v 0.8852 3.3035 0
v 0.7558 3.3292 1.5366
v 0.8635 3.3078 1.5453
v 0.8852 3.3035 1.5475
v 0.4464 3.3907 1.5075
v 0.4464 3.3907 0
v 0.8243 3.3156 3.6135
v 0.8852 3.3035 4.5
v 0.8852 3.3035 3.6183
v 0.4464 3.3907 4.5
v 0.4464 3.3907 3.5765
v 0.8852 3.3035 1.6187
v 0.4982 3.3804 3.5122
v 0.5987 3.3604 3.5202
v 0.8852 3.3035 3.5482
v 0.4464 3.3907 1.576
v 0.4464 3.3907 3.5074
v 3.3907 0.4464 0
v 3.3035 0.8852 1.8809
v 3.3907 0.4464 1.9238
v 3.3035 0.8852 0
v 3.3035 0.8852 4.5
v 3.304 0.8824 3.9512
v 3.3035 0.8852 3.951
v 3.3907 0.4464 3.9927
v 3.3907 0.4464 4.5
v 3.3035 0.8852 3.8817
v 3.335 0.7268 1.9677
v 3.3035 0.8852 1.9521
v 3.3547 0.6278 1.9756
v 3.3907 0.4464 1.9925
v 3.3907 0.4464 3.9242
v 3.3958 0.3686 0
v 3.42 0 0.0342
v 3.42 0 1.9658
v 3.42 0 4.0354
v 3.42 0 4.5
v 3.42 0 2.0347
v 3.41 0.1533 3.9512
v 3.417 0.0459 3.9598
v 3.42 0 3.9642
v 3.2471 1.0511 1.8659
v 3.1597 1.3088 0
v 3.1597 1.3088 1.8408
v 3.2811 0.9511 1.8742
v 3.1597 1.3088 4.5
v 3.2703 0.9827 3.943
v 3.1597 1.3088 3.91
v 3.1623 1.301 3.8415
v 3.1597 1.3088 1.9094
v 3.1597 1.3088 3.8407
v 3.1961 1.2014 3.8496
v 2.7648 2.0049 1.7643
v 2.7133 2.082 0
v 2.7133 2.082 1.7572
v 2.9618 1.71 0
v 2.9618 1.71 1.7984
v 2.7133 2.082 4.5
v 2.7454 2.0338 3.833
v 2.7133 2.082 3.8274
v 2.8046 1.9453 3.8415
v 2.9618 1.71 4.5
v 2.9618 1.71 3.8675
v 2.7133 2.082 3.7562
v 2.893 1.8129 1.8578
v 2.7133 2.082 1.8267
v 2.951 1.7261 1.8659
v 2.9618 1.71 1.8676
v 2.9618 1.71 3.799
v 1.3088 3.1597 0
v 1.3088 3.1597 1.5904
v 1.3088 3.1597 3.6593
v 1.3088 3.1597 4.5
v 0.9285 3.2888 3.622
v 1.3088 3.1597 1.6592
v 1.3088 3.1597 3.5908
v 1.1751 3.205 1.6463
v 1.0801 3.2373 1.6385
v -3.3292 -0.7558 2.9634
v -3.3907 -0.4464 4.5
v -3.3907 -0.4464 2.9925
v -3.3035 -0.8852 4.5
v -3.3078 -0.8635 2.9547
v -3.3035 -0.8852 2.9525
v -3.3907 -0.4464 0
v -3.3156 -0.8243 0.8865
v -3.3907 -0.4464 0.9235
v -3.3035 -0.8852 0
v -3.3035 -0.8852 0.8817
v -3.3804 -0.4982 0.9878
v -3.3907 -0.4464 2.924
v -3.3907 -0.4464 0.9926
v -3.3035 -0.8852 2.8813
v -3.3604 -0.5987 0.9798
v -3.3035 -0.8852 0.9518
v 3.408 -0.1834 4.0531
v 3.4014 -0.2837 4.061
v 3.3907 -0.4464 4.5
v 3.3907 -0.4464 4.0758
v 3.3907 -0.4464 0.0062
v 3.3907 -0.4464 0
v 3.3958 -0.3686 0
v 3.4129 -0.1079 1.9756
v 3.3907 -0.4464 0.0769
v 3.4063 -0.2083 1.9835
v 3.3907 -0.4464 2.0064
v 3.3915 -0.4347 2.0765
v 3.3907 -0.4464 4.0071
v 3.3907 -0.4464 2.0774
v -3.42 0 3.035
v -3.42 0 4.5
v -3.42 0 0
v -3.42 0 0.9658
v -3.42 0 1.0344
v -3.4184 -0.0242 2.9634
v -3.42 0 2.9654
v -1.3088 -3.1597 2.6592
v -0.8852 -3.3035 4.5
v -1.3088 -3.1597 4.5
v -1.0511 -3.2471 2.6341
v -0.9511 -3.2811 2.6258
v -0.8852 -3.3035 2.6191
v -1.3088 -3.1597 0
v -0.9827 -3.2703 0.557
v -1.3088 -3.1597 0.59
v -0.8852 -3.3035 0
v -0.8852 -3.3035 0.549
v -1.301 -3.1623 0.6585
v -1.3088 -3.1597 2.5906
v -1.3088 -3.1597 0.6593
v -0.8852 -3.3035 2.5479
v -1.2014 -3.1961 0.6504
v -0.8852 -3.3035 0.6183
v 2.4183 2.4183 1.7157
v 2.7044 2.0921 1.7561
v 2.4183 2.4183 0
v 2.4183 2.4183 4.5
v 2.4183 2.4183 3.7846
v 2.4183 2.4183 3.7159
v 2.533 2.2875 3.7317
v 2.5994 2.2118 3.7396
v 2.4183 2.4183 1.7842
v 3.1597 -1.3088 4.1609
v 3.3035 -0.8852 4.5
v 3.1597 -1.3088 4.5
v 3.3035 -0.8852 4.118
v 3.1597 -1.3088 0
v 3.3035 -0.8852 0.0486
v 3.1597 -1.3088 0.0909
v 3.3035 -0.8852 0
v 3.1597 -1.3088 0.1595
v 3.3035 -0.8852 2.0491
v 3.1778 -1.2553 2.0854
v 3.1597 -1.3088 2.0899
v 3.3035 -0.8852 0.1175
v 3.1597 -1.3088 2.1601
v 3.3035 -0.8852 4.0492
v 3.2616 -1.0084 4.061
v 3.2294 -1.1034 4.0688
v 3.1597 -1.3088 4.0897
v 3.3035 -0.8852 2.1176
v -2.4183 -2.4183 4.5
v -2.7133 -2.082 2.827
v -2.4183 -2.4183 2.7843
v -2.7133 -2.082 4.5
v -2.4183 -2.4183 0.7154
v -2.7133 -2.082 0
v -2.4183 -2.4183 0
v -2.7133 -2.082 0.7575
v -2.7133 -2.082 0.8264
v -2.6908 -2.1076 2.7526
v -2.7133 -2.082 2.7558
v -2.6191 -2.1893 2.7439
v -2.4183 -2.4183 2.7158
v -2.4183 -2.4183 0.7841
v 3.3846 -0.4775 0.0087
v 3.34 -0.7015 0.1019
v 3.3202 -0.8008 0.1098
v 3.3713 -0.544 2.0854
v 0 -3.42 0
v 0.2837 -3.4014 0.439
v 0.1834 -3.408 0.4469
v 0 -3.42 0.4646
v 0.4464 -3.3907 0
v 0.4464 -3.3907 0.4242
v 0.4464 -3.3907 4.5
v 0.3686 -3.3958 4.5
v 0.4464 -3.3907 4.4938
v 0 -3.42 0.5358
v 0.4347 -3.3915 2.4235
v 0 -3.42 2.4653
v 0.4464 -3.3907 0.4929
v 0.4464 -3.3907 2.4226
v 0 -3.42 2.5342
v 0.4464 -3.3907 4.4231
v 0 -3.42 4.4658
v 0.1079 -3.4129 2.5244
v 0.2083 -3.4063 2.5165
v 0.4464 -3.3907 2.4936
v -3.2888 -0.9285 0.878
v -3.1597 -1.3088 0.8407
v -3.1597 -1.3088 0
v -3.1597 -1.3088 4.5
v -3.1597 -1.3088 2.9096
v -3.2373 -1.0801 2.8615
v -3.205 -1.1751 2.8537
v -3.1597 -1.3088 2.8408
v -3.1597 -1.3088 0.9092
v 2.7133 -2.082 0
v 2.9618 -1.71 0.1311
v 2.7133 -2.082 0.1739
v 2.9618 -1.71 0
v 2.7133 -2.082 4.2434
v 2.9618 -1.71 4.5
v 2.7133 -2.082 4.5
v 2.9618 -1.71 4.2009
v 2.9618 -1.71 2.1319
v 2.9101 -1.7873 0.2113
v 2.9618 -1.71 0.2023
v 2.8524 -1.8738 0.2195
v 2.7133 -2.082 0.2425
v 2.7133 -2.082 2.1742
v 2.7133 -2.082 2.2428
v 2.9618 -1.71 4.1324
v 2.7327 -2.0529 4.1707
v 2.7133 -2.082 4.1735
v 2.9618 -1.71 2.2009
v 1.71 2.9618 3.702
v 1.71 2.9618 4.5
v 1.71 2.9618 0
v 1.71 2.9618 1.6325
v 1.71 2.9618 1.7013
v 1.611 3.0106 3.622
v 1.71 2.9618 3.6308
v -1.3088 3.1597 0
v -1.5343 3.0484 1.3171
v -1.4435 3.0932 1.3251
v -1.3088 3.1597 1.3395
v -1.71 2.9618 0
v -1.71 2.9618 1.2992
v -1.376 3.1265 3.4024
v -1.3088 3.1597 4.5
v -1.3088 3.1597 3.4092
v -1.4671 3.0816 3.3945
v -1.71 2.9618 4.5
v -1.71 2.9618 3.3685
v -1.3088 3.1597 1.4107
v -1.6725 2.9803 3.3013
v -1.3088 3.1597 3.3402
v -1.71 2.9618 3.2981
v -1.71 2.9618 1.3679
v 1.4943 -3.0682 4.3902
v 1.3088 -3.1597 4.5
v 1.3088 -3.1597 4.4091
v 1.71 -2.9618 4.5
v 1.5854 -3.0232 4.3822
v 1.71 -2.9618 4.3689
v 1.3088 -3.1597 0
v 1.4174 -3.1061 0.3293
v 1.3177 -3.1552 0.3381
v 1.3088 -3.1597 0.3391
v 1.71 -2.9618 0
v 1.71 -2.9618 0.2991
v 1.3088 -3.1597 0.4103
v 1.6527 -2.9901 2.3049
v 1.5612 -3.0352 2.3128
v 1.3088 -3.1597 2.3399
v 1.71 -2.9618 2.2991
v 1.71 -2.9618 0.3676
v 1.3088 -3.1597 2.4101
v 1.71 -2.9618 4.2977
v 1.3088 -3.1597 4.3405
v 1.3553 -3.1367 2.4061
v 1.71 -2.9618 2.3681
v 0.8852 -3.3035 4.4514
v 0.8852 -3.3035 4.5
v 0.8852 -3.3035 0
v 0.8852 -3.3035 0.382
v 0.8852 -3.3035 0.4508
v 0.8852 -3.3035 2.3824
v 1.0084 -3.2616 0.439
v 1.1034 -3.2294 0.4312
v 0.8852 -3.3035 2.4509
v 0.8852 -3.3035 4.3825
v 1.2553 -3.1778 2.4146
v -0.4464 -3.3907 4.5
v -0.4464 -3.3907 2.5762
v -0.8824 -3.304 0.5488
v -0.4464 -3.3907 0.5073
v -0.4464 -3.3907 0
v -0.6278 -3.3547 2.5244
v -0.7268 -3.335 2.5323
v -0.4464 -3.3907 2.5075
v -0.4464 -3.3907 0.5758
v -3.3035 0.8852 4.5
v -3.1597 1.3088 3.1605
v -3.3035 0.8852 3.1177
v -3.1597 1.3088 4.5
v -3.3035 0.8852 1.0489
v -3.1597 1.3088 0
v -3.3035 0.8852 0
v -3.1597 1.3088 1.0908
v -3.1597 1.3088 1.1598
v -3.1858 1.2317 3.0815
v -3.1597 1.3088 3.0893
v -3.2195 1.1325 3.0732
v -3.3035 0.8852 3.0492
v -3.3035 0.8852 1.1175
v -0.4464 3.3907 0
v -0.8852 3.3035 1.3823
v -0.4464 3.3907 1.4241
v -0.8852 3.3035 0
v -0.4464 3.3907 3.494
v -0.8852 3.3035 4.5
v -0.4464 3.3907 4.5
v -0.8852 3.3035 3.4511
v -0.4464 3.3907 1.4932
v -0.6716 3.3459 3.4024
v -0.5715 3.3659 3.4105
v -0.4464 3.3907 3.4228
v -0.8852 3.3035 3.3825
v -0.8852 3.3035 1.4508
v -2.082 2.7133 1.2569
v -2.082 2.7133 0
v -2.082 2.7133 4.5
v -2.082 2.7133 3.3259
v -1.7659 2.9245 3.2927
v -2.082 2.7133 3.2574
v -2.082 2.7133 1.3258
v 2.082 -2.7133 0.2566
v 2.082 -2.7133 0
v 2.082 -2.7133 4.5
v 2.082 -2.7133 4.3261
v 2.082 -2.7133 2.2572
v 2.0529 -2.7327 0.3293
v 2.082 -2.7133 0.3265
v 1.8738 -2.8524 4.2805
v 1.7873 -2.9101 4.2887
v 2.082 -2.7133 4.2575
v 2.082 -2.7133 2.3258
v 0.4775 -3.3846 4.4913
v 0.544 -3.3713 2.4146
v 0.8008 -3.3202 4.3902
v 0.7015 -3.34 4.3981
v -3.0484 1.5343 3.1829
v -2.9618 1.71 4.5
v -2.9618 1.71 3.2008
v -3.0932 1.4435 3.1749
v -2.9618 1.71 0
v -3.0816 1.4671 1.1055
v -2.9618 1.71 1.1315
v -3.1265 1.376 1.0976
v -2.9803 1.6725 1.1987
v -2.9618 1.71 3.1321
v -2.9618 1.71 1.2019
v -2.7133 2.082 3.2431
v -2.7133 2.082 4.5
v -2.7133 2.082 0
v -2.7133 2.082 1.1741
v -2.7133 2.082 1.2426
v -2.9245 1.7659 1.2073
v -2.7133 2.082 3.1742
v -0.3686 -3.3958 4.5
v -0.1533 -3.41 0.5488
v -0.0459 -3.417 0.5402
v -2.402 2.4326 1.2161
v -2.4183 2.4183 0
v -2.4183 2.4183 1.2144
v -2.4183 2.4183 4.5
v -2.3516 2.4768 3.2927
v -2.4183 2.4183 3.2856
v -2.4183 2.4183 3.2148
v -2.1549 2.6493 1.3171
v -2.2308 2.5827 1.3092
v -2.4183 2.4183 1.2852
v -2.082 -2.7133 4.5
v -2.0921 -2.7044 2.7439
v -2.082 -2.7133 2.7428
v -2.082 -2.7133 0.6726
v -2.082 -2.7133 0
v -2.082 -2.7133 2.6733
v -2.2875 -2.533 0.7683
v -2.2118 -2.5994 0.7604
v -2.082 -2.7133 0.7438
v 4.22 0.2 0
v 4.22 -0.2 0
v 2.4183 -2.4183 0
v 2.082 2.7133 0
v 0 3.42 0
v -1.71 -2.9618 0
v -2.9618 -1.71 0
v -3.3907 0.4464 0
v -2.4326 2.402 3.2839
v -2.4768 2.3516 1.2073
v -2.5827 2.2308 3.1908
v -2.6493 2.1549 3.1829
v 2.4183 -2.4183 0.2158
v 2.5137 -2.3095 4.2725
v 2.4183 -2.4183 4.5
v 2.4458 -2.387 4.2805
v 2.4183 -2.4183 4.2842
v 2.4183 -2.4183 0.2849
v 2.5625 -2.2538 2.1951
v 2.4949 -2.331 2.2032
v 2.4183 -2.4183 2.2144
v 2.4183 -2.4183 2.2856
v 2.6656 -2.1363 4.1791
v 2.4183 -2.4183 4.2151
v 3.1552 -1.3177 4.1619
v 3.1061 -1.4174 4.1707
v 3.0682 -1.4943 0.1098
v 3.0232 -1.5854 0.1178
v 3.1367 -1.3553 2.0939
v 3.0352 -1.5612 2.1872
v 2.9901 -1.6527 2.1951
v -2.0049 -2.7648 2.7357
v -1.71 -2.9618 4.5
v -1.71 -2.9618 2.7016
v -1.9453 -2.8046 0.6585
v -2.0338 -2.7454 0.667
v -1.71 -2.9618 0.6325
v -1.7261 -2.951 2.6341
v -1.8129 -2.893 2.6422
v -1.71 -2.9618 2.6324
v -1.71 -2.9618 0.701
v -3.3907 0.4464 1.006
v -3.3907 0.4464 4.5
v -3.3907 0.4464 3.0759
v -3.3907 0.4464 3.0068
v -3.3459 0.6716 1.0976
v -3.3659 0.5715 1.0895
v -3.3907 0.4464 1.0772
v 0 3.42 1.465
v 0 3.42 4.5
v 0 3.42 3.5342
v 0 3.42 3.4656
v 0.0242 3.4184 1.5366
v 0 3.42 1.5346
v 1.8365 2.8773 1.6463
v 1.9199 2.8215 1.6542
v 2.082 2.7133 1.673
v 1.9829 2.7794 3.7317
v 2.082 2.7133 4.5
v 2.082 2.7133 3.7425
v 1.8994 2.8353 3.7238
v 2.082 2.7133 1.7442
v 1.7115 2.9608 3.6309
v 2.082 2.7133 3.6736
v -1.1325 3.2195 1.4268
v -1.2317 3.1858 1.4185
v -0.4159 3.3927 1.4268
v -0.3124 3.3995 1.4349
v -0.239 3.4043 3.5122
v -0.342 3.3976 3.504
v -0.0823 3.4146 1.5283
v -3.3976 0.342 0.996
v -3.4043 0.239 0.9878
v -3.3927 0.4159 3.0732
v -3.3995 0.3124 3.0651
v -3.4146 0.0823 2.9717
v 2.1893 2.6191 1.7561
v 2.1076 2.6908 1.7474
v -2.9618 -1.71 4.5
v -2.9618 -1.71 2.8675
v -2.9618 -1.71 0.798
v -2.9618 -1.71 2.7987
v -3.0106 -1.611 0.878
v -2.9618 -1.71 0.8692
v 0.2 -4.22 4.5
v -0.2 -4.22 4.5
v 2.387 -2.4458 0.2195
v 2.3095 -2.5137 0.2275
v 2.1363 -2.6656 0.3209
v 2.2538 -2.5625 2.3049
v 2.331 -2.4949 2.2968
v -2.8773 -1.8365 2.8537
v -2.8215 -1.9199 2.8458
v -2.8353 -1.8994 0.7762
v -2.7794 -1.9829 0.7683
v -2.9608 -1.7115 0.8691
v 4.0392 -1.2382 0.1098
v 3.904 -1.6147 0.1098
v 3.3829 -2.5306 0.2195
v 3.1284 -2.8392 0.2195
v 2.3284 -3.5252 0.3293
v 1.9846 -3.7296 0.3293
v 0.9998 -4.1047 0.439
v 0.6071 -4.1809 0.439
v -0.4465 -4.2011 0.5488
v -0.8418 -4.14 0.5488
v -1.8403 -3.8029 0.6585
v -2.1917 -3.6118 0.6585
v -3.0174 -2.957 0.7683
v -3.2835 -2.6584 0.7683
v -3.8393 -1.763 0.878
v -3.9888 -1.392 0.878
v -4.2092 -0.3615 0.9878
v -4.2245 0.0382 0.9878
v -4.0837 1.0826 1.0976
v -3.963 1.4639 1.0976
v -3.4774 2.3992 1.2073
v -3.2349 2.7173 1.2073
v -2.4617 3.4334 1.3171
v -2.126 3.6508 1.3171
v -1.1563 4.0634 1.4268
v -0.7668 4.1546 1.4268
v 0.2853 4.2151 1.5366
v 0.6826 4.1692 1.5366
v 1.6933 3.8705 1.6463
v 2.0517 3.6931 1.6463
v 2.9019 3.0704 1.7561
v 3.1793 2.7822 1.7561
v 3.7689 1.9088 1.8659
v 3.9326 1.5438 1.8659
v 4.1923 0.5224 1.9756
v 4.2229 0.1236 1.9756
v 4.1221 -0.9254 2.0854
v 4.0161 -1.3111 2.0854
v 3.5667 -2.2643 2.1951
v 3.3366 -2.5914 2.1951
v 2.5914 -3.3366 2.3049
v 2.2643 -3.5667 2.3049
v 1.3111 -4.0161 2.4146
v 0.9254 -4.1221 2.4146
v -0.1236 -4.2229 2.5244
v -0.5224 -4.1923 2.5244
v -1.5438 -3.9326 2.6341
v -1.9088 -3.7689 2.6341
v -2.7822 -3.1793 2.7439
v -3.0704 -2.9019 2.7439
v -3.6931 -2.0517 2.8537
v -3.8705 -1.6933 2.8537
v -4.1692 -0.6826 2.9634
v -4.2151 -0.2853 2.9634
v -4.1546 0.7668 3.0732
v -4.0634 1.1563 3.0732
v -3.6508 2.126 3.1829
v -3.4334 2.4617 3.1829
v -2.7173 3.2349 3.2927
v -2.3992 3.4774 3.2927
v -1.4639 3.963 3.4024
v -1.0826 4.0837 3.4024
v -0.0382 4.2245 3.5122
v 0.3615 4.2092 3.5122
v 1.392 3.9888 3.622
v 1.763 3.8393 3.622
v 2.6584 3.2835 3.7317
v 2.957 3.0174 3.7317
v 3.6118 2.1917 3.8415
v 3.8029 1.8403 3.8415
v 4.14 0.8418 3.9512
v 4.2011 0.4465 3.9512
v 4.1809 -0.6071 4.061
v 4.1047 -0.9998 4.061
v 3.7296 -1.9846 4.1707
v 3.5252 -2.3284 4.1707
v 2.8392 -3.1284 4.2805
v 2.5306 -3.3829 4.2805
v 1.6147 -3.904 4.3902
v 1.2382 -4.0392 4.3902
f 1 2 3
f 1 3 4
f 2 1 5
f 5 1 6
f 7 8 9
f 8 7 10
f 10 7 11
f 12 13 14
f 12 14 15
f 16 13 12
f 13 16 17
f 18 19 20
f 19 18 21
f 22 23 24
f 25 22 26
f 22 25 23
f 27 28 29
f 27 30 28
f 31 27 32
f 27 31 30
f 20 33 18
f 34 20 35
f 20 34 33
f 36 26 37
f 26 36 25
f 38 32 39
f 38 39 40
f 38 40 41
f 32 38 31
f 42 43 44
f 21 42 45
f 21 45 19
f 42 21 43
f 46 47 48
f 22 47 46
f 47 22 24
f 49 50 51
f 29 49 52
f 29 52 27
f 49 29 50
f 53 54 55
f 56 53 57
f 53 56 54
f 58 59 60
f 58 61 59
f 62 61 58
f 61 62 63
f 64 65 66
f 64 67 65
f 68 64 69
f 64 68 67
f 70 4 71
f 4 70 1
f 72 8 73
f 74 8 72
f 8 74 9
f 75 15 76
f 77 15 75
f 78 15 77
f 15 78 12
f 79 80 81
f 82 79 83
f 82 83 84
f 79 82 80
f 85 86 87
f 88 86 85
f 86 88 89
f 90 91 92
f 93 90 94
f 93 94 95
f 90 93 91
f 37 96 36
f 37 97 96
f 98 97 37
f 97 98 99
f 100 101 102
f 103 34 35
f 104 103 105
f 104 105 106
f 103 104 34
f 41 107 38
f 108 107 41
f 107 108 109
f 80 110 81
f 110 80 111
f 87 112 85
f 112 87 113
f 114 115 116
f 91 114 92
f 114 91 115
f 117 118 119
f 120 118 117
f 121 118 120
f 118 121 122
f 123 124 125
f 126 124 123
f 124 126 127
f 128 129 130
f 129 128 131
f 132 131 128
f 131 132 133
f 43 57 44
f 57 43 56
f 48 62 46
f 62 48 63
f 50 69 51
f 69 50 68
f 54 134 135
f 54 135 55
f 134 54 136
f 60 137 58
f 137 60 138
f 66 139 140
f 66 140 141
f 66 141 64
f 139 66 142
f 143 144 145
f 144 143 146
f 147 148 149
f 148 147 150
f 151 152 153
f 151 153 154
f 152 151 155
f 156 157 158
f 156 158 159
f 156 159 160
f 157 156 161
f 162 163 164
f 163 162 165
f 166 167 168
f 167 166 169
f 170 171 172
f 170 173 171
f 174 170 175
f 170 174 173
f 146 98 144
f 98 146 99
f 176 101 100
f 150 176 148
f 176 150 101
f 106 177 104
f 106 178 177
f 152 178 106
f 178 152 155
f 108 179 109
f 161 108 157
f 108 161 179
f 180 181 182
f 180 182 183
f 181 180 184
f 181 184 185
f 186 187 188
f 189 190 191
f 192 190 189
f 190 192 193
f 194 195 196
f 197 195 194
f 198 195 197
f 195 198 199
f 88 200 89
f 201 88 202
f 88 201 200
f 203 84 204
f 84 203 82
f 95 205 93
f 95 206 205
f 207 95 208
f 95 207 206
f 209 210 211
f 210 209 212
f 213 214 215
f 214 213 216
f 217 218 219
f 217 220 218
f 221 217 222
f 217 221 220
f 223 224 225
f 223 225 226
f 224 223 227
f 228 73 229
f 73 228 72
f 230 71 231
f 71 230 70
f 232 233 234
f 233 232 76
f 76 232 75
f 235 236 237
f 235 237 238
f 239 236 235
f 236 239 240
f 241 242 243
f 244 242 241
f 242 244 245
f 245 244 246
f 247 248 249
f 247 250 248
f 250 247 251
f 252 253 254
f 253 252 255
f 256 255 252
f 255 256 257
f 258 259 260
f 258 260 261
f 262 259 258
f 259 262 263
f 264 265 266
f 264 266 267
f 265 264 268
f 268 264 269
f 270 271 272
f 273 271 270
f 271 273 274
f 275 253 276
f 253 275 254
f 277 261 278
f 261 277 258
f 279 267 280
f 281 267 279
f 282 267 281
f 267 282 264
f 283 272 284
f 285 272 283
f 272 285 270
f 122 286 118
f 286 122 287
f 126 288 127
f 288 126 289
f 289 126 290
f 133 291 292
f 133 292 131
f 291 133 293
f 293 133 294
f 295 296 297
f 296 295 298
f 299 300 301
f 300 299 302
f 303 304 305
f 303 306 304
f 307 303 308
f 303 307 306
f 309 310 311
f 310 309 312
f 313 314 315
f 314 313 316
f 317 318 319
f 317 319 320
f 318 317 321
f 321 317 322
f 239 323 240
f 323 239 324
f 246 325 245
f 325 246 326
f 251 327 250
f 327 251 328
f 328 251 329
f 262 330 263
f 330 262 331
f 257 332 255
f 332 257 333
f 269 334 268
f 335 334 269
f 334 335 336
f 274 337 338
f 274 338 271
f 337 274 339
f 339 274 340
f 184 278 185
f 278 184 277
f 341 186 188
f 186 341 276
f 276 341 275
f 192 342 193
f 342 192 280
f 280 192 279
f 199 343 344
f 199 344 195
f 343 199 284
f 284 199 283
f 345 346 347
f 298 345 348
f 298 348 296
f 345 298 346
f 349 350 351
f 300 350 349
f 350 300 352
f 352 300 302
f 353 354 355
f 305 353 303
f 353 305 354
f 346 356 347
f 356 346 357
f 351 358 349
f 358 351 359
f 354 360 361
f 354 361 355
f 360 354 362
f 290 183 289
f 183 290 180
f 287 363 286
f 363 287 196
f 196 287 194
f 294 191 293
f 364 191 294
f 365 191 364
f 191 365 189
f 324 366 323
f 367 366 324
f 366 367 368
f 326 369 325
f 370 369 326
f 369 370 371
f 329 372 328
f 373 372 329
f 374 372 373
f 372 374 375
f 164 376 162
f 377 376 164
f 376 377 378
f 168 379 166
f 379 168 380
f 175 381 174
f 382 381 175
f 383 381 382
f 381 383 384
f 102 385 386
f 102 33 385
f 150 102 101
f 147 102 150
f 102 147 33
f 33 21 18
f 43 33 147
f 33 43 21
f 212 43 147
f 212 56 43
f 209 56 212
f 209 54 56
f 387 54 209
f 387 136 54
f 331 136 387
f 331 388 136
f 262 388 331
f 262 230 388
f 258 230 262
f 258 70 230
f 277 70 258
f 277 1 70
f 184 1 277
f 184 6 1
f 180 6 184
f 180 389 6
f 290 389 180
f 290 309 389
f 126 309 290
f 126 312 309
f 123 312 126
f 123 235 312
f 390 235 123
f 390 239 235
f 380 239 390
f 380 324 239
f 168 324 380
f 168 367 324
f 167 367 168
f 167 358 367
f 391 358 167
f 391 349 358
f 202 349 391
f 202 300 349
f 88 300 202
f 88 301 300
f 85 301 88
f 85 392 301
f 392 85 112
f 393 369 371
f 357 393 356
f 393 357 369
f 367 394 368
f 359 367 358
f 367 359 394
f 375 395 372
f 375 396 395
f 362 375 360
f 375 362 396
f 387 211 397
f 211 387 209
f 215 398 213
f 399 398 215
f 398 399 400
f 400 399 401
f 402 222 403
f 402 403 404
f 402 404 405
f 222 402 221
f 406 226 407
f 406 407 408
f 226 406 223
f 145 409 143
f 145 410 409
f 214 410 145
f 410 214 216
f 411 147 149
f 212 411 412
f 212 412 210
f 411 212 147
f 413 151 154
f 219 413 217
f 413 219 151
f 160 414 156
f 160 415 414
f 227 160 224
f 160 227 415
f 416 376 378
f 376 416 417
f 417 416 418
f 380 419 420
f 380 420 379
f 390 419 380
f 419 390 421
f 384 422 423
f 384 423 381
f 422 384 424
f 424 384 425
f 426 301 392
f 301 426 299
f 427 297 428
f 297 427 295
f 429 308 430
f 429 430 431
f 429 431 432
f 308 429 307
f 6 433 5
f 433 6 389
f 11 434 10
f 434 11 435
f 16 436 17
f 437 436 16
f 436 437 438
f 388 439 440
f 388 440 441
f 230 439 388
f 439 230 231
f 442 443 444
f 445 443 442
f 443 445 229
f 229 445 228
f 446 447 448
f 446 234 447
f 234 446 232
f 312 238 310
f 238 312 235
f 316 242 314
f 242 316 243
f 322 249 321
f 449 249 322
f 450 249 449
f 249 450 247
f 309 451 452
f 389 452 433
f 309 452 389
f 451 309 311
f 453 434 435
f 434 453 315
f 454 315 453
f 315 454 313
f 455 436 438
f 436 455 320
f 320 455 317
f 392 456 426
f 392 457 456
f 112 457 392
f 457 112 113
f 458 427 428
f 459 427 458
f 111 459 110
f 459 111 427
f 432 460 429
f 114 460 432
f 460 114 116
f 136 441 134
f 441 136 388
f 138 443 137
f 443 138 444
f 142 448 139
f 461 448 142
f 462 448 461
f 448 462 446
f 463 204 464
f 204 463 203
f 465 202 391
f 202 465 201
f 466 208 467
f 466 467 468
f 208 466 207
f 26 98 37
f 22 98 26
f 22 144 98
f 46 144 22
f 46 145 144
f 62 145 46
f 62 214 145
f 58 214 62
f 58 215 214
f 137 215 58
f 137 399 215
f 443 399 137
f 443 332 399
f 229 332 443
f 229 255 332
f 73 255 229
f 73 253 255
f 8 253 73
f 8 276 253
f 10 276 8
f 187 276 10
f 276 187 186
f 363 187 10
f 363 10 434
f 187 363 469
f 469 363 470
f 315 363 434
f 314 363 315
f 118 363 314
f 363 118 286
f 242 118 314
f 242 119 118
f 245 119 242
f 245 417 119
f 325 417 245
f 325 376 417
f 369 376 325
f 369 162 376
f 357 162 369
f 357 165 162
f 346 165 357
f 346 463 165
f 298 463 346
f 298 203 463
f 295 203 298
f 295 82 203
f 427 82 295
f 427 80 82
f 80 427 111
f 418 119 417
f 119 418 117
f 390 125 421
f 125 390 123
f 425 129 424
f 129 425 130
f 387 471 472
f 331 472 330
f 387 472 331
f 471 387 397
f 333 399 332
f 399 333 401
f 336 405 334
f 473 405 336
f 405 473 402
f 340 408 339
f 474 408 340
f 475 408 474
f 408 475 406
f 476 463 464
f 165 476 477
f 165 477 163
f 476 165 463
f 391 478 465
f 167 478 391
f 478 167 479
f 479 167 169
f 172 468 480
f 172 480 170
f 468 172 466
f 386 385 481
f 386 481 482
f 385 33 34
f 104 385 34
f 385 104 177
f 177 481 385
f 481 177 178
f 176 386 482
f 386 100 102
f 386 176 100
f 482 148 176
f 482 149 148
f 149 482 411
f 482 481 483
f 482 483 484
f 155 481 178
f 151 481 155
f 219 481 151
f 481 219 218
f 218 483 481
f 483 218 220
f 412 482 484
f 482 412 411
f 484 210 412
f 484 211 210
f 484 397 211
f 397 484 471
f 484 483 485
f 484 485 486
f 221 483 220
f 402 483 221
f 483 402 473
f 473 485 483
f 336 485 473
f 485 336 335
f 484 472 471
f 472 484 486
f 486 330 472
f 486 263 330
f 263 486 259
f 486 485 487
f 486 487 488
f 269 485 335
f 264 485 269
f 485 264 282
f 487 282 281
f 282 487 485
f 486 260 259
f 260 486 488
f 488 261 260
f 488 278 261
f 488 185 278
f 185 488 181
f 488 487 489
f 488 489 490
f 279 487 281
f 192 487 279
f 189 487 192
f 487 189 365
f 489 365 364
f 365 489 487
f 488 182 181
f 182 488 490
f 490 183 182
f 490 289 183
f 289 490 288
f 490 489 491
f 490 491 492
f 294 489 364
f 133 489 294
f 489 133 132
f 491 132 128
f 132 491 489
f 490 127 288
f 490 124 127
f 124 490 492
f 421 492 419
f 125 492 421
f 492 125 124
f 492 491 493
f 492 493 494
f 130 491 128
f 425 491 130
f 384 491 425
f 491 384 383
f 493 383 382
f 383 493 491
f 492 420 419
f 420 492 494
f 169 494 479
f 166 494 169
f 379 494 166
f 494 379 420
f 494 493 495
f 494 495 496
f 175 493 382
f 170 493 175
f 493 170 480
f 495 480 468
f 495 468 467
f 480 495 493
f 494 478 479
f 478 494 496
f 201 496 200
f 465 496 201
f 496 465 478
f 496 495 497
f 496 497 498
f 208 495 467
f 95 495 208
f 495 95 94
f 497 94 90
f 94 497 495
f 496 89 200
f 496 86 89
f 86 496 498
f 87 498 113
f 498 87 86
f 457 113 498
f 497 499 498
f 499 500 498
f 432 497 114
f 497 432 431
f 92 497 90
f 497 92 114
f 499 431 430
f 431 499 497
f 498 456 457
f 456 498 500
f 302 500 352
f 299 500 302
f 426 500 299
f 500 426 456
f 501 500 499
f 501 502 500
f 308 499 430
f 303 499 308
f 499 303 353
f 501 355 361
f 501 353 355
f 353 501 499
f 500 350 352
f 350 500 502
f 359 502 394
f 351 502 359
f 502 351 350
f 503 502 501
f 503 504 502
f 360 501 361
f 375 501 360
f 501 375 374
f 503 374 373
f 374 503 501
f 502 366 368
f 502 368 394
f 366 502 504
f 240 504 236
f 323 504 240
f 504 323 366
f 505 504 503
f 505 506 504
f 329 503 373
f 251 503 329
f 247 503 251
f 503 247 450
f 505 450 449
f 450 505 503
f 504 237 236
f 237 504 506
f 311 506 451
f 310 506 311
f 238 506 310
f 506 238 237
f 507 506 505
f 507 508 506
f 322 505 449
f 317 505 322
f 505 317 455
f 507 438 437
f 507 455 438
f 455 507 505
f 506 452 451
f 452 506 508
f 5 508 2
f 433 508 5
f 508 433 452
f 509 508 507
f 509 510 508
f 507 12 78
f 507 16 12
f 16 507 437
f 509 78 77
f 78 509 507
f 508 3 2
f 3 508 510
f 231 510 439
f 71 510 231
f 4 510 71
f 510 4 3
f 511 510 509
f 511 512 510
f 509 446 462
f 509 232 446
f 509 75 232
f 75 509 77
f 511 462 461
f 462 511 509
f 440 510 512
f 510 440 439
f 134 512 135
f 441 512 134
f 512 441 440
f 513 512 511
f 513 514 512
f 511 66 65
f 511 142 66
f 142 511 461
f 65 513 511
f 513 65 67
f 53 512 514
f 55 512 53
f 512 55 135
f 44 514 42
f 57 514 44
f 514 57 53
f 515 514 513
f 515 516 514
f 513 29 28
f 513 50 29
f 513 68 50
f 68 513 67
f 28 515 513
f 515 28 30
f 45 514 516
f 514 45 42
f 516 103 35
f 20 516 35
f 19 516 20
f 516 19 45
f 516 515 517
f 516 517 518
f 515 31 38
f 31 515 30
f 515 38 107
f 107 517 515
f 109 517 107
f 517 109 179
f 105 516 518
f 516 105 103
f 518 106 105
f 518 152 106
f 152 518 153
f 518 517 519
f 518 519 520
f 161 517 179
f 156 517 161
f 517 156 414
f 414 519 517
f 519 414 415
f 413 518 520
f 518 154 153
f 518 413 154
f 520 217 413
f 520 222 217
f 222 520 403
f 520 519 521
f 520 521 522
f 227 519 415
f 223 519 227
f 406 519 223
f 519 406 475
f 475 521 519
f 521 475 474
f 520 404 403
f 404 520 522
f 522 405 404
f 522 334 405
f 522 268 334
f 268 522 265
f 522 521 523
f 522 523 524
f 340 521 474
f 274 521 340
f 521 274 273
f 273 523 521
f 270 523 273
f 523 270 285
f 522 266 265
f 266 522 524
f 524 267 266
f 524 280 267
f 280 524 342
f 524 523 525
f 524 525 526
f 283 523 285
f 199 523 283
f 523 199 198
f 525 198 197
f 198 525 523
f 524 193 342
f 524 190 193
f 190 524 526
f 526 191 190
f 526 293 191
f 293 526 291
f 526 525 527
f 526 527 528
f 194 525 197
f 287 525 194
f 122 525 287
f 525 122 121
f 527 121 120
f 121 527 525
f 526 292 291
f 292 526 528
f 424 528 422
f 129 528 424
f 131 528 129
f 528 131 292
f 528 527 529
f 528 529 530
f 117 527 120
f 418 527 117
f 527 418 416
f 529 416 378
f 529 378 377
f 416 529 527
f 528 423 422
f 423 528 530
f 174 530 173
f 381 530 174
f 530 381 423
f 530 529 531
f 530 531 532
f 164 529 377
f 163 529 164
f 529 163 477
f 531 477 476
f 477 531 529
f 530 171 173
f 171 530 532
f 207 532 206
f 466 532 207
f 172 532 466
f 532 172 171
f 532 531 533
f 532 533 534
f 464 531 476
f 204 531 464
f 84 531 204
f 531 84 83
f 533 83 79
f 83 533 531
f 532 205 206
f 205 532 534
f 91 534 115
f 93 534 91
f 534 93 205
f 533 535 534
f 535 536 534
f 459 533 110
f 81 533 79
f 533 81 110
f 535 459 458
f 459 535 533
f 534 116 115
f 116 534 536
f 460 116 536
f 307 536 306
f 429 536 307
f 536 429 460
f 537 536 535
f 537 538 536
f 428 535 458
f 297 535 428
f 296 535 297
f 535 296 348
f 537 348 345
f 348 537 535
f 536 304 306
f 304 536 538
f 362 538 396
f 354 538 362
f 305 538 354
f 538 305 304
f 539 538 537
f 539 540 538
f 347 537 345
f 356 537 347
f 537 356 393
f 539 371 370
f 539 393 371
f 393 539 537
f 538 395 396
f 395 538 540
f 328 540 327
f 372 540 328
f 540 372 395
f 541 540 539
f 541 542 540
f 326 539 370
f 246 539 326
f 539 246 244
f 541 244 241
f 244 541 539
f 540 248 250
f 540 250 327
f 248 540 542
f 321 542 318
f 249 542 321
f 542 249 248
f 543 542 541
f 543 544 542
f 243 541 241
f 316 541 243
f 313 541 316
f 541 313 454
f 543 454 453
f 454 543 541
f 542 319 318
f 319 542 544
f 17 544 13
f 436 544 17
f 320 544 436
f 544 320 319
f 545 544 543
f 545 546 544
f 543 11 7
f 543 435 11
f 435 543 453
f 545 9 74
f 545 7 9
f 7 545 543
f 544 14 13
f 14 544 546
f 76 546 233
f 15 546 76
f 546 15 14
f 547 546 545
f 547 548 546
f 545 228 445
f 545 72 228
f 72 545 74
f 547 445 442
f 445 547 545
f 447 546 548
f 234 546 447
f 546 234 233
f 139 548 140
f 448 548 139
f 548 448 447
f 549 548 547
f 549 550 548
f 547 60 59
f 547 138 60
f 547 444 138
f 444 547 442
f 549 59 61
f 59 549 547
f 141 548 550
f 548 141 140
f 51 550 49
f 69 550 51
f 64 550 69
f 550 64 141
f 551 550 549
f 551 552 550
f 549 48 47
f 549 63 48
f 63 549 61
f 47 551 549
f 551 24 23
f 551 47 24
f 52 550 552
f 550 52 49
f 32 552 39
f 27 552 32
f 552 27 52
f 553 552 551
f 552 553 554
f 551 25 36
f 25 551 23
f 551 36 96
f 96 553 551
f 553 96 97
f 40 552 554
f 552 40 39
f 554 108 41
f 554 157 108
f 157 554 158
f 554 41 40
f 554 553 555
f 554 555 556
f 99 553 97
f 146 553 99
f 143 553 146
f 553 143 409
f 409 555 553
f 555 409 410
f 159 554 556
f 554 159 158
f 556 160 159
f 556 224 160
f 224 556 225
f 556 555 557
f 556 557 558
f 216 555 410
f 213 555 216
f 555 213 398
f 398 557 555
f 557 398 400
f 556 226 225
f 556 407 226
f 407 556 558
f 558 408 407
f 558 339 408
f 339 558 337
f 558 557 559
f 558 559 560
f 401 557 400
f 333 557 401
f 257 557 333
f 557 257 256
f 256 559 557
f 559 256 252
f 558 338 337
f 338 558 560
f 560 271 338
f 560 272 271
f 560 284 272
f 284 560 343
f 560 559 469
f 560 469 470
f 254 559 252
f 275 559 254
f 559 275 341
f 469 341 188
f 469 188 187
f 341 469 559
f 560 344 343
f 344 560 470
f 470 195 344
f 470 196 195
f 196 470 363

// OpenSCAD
$fn=48;
module thread_solid(){
  union(){
    cylinder(r=3.42,h=4.5);
    linear_extrude(height=4.5,twist=360*4.5/2.0,slices=ceil(4.5/2.0*18),convexity=30)
      polygon(points=[[3.42-0.08,-0.76/2],[4.22,-0.4/2],[4.22,0.4/2],[3.42-0.08,0.76/2]]);
  }
}
thread_solid();
